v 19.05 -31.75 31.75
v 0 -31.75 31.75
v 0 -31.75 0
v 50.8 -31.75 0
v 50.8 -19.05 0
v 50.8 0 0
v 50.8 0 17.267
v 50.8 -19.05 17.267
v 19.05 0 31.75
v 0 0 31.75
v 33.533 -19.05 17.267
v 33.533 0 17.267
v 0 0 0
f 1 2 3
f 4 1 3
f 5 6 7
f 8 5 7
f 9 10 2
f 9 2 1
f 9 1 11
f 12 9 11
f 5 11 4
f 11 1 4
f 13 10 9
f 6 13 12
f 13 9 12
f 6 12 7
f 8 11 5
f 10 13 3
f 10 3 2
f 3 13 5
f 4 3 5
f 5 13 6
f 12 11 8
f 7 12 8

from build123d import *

# Parameters (mm, degrees)
F0_W     = 50.8
F0_H     = 31.75
F1_DEPTH = 31.75
F3_DEPTH = 12.7
F5_DEPTH = 25.4
F7_DEPTH = 25.4


with BuildPart() as f1:
    # F0 (on Front) → F1 (new body)
    with BuildSketch(Plane.XZ):
        with Locations((25.4, 15.875)):
            Rectangle(F0_W, F0_H)
    extrude(amount=F1_DEPTH)

    # F2 (on face) → F3 (cut)
    with BuildSketch(Plane.XZ.offset(31.75)):
        Polygon((50.8, 31.75), (19.05, 31.75), (50.8, 0), align=None)
    extrude(amount=-F3_DEPTH, mode=Mode.SUBTRACT)

    # F4 (on face) → F5 (cut)
    with BuildSketch(Plane(origin=(0, 0, 0), x_dir=(-1, 0, 0), z_dir=(0, 1, 0))):
        Polygon((-38.1, 17.2671154141), (-25.4, 31.75), (-50.8, 31.75), (-50.8, 17.2671154141), align=None)
    extrude(amount=-F5_DEPTH, mode=Mode.SUBTRACT)

    # F6 (on face) → F7 (cut)
    with BuildSketch(Plane.XZ.offset(19.05)):
        Polygon((33.5328845859, 17.2671154141), (38.1, 17.2671154141), (25.4, 31.75), (19.05, 31.75), align=None)
    extrude(amount=-F7_DEPTH, mode=Mode.SUBTRACT)


solid = f1.part
